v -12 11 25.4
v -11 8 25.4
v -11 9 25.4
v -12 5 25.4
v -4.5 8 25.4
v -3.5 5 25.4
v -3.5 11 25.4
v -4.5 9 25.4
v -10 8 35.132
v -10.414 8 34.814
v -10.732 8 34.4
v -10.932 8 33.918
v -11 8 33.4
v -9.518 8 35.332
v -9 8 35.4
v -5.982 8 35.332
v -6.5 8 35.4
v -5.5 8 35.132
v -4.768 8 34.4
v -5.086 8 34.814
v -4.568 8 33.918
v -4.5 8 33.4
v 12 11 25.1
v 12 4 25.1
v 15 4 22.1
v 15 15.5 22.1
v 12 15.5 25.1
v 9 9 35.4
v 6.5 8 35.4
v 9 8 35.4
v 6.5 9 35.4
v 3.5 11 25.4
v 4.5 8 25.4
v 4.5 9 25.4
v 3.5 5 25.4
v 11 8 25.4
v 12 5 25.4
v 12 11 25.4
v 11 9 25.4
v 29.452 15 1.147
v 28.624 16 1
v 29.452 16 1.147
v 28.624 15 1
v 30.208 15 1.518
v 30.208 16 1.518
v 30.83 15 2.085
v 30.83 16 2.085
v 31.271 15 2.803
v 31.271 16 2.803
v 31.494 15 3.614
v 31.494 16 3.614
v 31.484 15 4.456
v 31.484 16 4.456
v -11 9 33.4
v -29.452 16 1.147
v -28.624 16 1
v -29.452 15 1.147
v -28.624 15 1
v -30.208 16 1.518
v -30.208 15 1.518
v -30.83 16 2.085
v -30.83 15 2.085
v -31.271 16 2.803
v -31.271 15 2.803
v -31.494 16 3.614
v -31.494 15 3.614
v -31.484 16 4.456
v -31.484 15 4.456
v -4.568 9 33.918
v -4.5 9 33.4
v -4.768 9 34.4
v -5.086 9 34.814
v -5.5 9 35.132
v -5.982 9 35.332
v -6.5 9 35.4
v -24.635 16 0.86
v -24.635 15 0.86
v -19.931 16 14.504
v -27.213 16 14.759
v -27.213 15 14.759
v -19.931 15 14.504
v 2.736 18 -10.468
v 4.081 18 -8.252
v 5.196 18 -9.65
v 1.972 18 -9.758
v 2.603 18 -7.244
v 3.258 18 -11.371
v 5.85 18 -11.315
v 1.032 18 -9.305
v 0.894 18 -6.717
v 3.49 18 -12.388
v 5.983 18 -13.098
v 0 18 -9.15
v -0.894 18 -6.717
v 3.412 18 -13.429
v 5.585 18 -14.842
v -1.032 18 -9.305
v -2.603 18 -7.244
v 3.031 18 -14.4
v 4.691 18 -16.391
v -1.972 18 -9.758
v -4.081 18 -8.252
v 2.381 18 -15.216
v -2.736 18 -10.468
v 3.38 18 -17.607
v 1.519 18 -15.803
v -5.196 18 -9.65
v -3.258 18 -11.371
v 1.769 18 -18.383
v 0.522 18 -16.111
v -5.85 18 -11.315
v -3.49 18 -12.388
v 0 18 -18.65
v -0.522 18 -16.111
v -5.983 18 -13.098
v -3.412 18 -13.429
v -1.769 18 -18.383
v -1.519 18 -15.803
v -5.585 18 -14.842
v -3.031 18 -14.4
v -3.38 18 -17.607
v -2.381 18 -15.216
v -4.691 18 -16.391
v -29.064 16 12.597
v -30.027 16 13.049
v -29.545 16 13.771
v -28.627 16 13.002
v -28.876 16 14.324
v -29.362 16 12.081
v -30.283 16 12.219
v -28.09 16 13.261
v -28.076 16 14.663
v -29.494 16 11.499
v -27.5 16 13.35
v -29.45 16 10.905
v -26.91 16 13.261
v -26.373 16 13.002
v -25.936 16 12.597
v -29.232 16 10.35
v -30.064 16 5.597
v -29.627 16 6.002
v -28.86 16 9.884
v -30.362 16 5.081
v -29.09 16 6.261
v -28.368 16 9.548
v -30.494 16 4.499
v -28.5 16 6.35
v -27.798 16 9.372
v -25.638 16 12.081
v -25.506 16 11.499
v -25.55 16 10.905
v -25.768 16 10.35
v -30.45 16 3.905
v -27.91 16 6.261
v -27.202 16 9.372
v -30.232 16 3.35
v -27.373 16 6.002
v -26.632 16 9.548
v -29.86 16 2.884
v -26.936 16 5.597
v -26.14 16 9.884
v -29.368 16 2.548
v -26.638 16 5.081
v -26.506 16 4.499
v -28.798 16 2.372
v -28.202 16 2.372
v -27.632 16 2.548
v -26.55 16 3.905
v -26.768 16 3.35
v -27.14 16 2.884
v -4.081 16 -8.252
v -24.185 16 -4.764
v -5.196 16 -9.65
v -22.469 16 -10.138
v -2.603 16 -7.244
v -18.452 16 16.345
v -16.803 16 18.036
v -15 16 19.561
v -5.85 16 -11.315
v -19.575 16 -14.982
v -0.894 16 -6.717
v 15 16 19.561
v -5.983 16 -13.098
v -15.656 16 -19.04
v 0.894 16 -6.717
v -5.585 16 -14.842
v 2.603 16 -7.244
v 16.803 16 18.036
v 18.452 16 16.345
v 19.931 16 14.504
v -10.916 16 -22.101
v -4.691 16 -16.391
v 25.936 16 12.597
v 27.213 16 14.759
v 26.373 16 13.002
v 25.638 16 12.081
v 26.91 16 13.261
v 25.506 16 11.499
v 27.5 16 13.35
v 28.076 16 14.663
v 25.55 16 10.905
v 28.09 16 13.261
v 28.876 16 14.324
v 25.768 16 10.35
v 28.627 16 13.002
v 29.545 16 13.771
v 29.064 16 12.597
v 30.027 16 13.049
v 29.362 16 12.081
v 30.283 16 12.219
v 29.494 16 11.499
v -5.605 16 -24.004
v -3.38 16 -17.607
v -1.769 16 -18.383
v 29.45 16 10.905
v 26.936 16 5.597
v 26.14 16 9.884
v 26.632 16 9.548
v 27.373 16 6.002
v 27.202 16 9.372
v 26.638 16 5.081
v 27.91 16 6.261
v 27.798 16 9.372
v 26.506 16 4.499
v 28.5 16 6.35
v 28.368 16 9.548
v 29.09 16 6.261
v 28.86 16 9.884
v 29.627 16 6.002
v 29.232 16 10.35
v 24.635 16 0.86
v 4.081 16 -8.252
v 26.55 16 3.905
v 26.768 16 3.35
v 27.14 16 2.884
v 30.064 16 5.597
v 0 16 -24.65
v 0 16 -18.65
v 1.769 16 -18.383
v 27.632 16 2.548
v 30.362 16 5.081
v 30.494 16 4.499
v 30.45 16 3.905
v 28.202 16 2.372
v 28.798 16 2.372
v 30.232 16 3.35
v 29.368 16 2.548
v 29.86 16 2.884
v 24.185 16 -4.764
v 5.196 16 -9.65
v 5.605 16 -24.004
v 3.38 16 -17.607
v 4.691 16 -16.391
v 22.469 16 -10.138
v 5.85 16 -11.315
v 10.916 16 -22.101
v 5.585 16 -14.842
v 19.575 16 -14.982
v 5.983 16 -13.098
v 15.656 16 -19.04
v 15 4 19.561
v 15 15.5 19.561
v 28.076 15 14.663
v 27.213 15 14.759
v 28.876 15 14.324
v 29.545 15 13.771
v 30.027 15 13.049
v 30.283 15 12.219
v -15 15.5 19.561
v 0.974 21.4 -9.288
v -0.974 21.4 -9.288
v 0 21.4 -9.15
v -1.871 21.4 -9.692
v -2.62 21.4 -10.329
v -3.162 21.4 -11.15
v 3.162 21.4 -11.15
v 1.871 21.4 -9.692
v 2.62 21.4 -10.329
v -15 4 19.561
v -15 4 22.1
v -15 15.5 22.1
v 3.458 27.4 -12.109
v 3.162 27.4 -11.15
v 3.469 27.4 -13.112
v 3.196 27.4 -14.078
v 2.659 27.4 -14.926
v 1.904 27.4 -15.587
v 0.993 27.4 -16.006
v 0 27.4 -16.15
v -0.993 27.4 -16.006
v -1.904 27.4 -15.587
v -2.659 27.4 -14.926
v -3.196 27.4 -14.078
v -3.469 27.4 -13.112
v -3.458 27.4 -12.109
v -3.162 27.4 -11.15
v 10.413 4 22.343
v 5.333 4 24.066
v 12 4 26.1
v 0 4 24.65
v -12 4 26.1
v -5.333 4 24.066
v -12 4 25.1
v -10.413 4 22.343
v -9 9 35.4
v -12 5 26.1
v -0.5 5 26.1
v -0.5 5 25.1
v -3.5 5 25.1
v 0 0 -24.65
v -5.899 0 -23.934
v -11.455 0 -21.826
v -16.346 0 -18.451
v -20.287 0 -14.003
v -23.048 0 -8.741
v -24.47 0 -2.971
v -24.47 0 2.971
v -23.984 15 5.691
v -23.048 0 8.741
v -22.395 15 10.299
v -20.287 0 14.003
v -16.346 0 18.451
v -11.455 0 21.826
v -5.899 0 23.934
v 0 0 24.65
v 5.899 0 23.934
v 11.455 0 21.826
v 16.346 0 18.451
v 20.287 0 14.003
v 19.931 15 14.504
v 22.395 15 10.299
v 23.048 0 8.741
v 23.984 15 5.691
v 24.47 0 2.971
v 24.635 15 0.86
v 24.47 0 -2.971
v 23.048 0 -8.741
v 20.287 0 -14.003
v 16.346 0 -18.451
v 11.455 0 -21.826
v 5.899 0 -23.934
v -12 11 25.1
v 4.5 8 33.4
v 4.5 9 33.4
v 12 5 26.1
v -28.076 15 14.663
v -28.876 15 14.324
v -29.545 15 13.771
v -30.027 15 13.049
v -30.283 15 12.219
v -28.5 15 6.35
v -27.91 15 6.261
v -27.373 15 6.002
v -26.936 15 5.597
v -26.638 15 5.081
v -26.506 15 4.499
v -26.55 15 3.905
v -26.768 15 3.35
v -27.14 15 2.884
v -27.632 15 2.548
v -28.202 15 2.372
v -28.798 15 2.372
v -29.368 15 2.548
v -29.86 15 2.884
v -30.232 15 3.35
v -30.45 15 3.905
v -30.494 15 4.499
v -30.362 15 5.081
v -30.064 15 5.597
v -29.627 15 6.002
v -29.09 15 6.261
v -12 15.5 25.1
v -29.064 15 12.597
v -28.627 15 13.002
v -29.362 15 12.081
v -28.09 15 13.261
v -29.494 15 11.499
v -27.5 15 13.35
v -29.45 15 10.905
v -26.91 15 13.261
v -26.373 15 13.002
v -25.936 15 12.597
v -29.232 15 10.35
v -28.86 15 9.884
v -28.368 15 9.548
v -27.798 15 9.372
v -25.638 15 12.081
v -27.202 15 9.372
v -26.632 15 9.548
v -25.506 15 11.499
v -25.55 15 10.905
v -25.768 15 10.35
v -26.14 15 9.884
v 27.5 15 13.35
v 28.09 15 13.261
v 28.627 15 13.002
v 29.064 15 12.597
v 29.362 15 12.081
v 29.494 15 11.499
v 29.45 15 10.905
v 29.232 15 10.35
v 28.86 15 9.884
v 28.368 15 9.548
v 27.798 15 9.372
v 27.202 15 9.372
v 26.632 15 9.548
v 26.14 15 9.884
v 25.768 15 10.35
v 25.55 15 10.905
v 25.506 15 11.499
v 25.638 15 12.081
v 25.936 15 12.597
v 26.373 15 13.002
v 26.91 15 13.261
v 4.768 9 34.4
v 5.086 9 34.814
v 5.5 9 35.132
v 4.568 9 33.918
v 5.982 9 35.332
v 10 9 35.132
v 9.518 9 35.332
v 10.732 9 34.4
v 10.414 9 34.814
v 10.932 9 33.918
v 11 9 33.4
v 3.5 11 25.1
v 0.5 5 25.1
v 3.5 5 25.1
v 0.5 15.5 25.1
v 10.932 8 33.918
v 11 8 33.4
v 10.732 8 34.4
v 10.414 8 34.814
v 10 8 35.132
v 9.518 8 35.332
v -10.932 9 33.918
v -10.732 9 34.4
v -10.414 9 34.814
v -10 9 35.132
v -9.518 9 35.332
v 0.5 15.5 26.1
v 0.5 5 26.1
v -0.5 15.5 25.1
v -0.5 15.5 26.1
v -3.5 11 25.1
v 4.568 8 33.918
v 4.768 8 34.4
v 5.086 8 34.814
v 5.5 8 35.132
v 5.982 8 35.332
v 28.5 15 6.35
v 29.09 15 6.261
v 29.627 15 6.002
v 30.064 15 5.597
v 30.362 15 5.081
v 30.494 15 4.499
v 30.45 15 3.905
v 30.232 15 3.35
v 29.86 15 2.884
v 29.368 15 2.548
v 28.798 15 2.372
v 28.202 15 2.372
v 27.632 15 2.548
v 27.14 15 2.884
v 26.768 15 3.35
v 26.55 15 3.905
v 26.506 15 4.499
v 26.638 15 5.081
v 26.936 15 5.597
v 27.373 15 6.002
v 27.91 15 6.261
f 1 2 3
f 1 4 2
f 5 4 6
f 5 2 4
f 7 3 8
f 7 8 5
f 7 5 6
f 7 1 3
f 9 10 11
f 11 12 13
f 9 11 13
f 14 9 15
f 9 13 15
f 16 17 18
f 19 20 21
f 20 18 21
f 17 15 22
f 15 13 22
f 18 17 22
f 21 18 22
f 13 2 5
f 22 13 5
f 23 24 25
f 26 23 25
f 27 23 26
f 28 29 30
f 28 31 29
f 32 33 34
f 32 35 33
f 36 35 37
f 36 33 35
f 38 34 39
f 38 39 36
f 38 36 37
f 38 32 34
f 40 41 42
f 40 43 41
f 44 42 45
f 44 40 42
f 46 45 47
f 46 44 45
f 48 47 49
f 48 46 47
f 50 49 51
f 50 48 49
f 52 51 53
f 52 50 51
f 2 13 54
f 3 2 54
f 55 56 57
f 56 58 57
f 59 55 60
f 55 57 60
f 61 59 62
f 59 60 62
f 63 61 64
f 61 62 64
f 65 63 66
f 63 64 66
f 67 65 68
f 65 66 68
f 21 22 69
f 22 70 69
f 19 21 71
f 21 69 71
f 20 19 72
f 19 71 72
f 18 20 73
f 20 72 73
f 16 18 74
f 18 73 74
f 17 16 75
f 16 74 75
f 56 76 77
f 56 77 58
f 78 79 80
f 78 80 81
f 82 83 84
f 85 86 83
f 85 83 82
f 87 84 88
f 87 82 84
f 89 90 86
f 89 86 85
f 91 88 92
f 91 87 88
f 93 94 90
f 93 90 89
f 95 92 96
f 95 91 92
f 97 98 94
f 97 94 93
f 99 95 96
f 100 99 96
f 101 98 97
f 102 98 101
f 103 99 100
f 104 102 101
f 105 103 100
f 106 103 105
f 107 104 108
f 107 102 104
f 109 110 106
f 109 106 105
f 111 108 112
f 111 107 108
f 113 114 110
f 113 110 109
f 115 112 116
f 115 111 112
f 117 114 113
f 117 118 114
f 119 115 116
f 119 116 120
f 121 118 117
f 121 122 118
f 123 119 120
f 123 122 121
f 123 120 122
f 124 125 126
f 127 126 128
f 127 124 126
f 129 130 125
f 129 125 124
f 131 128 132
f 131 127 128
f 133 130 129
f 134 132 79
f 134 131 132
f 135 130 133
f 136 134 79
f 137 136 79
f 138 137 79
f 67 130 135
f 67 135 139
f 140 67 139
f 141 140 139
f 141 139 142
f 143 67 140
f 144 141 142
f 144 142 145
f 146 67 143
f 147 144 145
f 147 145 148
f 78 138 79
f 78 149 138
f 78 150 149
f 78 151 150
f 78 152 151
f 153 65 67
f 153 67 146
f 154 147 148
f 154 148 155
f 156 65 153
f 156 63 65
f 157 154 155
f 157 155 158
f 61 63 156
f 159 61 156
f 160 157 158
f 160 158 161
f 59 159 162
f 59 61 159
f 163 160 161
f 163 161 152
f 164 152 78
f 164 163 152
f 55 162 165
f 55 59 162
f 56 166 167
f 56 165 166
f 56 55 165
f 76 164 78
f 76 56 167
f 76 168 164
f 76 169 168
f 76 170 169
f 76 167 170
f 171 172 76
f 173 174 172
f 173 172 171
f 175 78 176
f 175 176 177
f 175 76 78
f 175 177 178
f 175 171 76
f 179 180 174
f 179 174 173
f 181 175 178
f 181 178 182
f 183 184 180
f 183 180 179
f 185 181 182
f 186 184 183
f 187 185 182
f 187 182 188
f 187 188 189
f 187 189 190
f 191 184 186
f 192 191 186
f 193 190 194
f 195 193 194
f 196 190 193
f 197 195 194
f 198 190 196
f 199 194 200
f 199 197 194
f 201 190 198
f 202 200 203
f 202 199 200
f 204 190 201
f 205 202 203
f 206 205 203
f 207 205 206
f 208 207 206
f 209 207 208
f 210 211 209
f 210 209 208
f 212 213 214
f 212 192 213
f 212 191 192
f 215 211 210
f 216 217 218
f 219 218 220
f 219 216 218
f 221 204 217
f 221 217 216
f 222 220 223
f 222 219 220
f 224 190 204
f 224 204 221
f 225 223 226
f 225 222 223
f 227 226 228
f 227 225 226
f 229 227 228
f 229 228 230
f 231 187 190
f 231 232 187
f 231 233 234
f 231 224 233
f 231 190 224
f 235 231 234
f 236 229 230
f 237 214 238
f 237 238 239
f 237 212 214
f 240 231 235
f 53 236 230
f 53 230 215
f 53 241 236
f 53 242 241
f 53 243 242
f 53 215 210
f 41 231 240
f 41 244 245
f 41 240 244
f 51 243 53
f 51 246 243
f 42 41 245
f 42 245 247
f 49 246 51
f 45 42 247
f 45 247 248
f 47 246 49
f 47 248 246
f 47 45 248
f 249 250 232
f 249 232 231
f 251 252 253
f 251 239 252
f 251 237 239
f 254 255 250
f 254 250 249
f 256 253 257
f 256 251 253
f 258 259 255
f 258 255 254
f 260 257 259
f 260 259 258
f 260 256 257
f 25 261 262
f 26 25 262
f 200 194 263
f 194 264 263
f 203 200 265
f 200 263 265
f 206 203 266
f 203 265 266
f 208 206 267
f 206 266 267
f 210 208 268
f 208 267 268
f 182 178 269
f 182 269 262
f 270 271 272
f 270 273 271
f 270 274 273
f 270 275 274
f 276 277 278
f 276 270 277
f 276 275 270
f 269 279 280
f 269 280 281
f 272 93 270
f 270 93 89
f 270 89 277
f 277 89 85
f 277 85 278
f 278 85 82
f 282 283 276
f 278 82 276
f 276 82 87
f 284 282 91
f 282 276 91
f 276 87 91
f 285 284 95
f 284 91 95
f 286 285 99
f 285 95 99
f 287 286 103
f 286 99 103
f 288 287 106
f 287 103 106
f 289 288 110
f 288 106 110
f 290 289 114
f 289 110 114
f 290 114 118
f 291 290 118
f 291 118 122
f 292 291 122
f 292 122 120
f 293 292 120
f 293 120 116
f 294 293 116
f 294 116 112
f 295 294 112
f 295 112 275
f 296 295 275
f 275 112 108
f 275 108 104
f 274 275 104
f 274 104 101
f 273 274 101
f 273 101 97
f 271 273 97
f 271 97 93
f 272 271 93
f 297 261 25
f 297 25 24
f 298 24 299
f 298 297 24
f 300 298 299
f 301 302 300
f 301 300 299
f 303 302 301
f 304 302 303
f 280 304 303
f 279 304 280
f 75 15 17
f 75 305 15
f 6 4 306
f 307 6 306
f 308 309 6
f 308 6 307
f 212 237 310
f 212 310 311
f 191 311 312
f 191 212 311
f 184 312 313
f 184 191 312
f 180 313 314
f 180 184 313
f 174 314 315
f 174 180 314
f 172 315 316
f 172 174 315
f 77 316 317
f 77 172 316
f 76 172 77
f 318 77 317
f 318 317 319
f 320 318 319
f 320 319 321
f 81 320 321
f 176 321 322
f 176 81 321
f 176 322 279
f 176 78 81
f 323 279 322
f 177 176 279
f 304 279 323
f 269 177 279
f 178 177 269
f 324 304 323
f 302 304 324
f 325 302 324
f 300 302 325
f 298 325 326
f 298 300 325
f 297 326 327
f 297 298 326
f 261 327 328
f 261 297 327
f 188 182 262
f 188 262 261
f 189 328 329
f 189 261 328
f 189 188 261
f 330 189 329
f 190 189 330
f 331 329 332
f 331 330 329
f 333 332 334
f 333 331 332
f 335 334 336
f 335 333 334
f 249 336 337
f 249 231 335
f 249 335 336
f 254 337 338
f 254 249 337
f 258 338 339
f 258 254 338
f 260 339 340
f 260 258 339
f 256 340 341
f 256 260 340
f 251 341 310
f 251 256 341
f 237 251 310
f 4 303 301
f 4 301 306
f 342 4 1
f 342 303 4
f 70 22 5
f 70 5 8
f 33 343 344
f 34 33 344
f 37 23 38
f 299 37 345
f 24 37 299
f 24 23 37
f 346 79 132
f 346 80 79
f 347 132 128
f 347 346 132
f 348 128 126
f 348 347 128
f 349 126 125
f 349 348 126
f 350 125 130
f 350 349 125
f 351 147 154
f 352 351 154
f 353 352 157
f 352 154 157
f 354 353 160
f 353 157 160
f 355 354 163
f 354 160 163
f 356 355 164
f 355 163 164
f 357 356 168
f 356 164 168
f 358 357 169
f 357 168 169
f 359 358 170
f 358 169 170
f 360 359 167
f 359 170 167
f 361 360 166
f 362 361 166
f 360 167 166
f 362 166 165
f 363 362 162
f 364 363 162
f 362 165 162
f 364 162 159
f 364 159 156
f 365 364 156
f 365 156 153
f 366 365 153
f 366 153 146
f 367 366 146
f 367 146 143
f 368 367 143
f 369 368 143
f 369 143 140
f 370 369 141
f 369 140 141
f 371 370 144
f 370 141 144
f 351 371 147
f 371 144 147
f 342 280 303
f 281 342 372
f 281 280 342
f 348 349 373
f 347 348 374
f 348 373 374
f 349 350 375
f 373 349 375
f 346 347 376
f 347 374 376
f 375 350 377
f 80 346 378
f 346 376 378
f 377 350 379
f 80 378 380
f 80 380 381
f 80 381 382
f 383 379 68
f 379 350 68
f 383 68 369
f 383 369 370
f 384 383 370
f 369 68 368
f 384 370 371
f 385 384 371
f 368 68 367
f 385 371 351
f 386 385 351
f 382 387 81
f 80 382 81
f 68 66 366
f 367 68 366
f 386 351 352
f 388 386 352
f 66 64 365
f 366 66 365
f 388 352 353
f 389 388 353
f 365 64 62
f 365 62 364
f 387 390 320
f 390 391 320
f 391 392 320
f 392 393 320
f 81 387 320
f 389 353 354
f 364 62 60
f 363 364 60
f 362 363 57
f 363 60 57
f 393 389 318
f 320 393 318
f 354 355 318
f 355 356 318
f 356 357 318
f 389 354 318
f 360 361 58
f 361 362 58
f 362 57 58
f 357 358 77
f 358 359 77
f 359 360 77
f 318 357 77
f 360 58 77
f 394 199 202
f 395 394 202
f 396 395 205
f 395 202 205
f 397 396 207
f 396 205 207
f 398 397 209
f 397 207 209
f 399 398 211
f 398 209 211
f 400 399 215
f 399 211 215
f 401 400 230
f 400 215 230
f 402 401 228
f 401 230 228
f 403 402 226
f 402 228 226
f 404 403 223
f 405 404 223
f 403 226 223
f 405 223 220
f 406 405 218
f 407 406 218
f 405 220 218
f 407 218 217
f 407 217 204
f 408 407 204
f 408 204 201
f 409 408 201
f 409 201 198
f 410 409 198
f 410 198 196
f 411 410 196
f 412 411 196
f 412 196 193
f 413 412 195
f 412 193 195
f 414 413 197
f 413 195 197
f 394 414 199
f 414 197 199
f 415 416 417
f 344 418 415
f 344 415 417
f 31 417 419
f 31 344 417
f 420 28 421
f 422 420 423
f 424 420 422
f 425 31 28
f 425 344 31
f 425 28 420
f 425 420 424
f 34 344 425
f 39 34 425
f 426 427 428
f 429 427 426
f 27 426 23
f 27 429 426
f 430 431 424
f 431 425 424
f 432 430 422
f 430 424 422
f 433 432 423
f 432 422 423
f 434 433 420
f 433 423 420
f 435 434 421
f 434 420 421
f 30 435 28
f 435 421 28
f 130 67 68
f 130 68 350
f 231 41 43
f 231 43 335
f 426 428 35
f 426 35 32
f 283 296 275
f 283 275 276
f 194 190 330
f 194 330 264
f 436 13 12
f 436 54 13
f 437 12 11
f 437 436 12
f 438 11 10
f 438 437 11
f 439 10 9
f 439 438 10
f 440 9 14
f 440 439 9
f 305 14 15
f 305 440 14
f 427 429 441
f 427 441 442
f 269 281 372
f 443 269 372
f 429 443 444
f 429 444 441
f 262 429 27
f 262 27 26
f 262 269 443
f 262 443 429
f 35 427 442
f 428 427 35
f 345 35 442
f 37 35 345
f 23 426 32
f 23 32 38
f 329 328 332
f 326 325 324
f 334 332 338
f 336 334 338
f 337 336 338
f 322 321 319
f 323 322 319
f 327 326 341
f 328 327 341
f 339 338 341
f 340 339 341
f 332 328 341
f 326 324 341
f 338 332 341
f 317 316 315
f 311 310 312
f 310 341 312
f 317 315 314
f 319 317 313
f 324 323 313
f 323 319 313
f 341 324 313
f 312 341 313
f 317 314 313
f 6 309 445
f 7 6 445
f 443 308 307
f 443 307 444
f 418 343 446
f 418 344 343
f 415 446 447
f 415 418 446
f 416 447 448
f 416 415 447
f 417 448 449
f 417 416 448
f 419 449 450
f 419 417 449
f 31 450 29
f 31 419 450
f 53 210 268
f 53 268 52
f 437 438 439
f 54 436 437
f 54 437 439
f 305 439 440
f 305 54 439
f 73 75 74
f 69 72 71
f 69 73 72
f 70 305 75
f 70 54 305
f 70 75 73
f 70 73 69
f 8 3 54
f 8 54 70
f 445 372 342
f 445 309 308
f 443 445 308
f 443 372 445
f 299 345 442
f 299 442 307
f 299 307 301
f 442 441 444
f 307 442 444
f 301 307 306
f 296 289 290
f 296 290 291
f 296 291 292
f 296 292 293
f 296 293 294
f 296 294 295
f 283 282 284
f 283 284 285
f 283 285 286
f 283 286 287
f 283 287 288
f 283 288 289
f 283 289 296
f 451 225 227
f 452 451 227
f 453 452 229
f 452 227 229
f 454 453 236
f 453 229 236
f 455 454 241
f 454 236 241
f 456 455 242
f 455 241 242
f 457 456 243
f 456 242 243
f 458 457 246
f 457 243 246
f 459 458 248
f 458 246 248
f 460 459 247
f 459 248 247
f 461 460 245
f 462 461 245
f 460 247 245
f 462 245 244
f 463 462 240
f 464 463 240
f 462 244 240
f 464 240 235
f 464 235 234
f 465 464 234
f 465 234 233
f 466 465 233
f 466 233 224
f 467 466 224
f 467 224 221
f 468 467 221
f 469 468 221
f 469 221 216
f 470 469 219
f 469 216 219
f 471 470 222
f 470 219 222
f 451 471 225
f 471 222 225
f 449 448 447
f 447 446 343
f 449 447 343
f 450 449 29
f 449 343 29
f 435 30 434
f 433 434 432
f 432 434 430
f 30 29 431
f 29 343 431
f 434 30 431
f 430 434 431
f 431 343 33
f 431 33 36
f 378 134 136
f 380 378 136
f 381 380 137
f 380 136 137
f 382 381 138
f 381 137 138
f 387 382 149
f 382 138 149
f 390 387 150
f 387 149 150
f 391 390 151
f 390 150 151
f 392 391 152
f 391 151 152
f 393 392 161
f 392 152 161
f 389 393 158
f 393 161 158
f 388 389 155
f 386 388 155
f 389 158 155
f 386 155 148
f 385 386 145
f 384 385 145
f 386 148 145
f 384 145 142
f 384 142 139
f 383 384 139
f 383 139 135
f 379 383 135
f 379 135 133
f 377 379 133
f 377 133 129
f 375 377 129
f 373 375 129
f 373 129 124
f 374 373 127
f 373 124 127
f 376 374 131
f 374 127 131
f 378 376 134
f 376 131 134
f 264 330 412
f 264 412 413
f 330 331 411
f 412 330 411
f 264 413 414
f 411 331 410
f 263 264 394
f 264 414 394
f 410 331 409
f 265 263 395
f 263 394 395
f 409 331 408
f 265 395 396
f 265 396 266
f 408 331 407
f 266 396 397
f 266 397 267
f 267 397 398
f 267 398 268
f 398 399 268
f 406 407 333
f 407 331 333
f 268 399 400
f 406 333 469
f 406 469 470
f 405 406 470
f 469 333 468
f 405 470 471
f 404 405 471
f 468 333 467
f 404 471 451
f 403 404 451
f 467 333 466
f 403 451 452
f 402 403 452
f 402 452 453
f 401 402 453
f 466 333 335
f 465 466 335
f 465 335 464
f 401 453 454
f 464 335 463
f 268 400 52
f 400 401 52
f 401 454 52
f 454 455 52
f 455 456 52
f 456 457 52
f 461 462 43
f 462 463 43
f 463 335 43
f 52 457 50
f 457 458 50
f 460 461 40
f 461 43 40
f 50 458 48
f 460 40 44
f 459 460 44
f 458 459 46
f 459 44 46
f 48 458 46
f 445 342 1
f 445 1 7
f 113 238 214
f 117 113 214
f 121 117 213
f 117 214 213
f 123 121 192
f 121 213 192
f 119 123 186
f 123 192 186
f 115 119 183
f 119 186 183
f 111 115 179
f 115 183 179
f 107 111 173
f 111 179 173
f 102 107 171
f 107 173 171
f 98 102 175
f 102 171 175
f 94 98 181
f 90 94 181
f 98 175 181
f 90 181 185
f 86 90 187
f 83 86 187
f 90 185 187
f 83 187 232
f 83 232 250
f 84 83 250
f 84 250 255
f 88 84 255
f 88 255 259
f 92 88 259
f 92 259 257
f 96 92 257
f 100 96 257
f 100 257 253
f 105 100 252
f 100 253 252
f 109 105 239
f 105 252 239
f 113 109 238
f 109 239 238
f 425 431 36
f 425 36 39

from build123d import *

# Parameters (mm, degrees)
ESBO_O1_W       = 24.65
ESBO_O1_H       = 16
ESBO_O2_W       = 30
ESBO_O2_H       = 12
EXTRUS_O1_DEPTH = 25.1
CHANFRO1_SIZE   = 3
EXTRUS_O2_DEPTH = 1
ESBO_O5_W       = 8.5
ESBO_O5_H       = 6
EXTRUS_O3_DEPTH = 0.3
ESBO_O6_W       = 6.5
ESBO_O6_H       = 1
EXTRUS_O4_DEPTH = 10
ESBO_O7_R       = 2
EXTRUS_O5_DEPTH = 1
FILETE1_R       = 3
ESBO_O8_R       = 6
EXTRUS_O6_DEPTH = 2
ESBO_O9_R       = 3.5
EXTRUS_O7_DEPTH = 9.4
ESBO_O10_W      = 6.32455532
ESBO_O10_H      = 3.599019514
EXTRUS_O8_DEPTH = 6
ESBO_O11_W      = 30
ESBO_O11_H      = 9.10840564
EXTRUS_O9_DEPTH = 0.5
FILETE2_R       = 2


with BuildPart() as part:
    # Esboço1 → Revolução1 (revolve)
    with BuildSketch(Plane.XY, mode=Mode.PRIVATE) as revolu_o1_sk:
        with Locations((-12.325, 8)):
            Rectangle(ESBO_O1_W, ESBO_O1_H)
    revolve(revolu_o1_sk.sketch.rotate(Axis((0, 0, 0), (0, 1, 0)), 270), axis=Axis((0, 0, 0), (0, 1, 0)))

    # Esboço2 → Extrusão1 (add)
    with BuildSketch(Plane.XY):
        with Locations((0, 10)):
            Rectangle(ESBO_O2_W, ESBO_O2_H)
    extrude(amount=EXTRUS_O1_DEPTH)

    # Chanfro1
    chanfro1_edges = [part.edges().sort_by_distance(p)[0] for p in [
        (-15, 10, 25.1),
        (15, 10, 25.1),
    ]]
    chamfer(chanfro1_edges, length=CHANFRO1_SIZE)

    # Esboço4 → Extrusão2 (add)
    with BuildSketch(Plane.XY.offset(25.1)):
        Polygon((-12, 5), (-0.5, 5), (-0.5, 16), (0.5, 16), (0.5, 5), (12, 5), (12, 4), (-12, 4), align=None)
    extrude(amount=EXTRUS_O2_DEPTH)

    # Esboço5 → Extrusão3 (add)
    with BuildSketch(Plane.XY.offset(25.1)):
        with Locations((-7.75, 8)):
            Rectangle(ESBO_O5_W, ESBO_O5_H)
        with Locations((7.75, 8)):
            Rectangle(ESBO_O5_W, ESBO_O5_H)
    extrude(amount=EXTRUS_O3_DEPTH)

    # Esboço6 → Extrusão4 (add)
    with BuildSketch(Plane.XY.offset(25.4)):
        with Locations((-7.75, 8.5)):
            Rectangle(ESBO_O6_W, ESBO_O6_H)
        with Locations((7.75, 8.5)):
            Rectangle(ESBO_O6_W, ESBO_O6_H)
    extrude(amount=EXTRUS_O4_DEPTH)

    # Esboço7 → Extrusão5 (add)
    # profile 1 of 2: a face of its own
    with BuildSketch(Plane(origin=(0, 16, 0), x_dir=(1, 0, 0), z_dir=(0, 1, 0))):
        with BuildLine():
            ThreePointArc((-19.930990459, -14.504417235), (-23.303909287, -8.034320875), (-24.634983886, -0.860272594))
            Line((-24.634983886, -0.860272594), (-32, -1.117464624))
            Line((-32, -1.117464624), (-29.875626197, -14.851691567))
            Line((-29.875626197, -14.851691567), (-19.930990459, -14.504417235))
        make_face()
        with Locations(Location((-27.5, -11.35, 0), (0, 0, 270))):
            Circle(ESBO_O7_R, mode=Mode.SUBTRACT)
        with Locations(Location((-28.5, -4.35, 0), (0, 0, 270))):
            Circle(ESBO_O7_R, mode=Mode.SUBTRACT)
    # profile 2 of 2: a face of its own
    with BuildSketch(Plane(origin=(0, 16, 0), x_dir=(1, 0, 0), z_dir=(0, 1, 0))):
        with BuildLine():
            Line((32, -1.117464624), (24.634983886, -0.860272594))
            ThreePointArc((24.634983886, -0.860272594), (23.303909287, -8.034320875), (19.930990459, -14.504417235))
            Line((19.930990459, -14.504417235), (29.875626197, -14.851691567))
            Line((29.875626197, -14.851691567), (32, -1.117464624))
        make_face()
        with Locations(Location((27.5, -11.35, 0), (0, 0, 270))):
            Circle(ESBO_O7_R, mode=Mode.SUBTRACT)
        with Locations(Location((28.5, -4.35, 0), (0, 0, 270))):
            Circle(ESBO_O7_R, mode=Mode.SUBTRACT)
    extrude(amount=-EXTRUS_O5_DEPTH)

    # Filete1
    filete1_edges = [part.edges().sort_by_distance(p)[0] for p in [
        (-32, 15.5, 1.117464624),
        (-29.875626197, 15.5, 14.851691567),
        (32, 15.5, 1.117464624),
        (29.875626197, 15.5, 14.851691567),
    ]]
    fillet(filete1_edges, radius=FILETE1_R)

    # Esboço8 → Extrusão6 (add)
    with BuildSketch(Plane(origin=(0, 16, 0), x_dir=(1, 0, 0), z_dir=(0, 1, 0))):
        with Locations(Location((0, 12.65, 0), (0, 0, 90))):
            Circle(ESBO_O8_R)
    extrude(amount=EXTRUS_O6_DEPTH)

    # Esboço9 → Extrusão7 (add)
    with BuildSketch(Plane(origin=(0, 18, 0), x_dir=(1, 0, 0), z_dir=(0, 1, 0))):
        with Locations(Location((0, 12.65, 0), (0, 0, 270))):
            Circle(ESBO_O9_R)
    extrude(amount=EXTRUS_O7_DEPTH)

    # Esboço10 → Extrusão8 (cut)
    with BuildSketch(Plane(origin=(0, 27.4, 0), x_dir=(1, 0, 0), z_dir=(0, 1, 0))):
        with Locations((0, 9.350490243)):
            Rectangle(ESBO_O10_W, ESBO_O10_H)
    extrude(amount=-EXTRUS_O8_DEPTH, mode=Mode.SUBTRACT)

    # Esboço11 → Extrusão9 (cut)
    with BuildSketch(Plane(origin=(0, 16, 0), x_dir=(1, 0, 0), z_dir=(0, 1, 0))):
        with Locations((0, -24.114941559)):
            Rectangle(ESBO_O11_W, ESBO_O11_H)
    extrude(amount=-EXTRUS_O9_DEPTH, mode=Mode.SUBTRACT)

    # Filete2
    filete2_edges = [part.edges().sort_by_distance(p)[0] for p in [
        (4.5, 8.5, 35.4),
        (11, 8.5, 35.4),
        (-11, 8.5, 35.4),
        (-4.5, 8.5, 35.4),
    ]]
    fillet(filete2_edges, radius=FILETE2_R)


solid = part.part
